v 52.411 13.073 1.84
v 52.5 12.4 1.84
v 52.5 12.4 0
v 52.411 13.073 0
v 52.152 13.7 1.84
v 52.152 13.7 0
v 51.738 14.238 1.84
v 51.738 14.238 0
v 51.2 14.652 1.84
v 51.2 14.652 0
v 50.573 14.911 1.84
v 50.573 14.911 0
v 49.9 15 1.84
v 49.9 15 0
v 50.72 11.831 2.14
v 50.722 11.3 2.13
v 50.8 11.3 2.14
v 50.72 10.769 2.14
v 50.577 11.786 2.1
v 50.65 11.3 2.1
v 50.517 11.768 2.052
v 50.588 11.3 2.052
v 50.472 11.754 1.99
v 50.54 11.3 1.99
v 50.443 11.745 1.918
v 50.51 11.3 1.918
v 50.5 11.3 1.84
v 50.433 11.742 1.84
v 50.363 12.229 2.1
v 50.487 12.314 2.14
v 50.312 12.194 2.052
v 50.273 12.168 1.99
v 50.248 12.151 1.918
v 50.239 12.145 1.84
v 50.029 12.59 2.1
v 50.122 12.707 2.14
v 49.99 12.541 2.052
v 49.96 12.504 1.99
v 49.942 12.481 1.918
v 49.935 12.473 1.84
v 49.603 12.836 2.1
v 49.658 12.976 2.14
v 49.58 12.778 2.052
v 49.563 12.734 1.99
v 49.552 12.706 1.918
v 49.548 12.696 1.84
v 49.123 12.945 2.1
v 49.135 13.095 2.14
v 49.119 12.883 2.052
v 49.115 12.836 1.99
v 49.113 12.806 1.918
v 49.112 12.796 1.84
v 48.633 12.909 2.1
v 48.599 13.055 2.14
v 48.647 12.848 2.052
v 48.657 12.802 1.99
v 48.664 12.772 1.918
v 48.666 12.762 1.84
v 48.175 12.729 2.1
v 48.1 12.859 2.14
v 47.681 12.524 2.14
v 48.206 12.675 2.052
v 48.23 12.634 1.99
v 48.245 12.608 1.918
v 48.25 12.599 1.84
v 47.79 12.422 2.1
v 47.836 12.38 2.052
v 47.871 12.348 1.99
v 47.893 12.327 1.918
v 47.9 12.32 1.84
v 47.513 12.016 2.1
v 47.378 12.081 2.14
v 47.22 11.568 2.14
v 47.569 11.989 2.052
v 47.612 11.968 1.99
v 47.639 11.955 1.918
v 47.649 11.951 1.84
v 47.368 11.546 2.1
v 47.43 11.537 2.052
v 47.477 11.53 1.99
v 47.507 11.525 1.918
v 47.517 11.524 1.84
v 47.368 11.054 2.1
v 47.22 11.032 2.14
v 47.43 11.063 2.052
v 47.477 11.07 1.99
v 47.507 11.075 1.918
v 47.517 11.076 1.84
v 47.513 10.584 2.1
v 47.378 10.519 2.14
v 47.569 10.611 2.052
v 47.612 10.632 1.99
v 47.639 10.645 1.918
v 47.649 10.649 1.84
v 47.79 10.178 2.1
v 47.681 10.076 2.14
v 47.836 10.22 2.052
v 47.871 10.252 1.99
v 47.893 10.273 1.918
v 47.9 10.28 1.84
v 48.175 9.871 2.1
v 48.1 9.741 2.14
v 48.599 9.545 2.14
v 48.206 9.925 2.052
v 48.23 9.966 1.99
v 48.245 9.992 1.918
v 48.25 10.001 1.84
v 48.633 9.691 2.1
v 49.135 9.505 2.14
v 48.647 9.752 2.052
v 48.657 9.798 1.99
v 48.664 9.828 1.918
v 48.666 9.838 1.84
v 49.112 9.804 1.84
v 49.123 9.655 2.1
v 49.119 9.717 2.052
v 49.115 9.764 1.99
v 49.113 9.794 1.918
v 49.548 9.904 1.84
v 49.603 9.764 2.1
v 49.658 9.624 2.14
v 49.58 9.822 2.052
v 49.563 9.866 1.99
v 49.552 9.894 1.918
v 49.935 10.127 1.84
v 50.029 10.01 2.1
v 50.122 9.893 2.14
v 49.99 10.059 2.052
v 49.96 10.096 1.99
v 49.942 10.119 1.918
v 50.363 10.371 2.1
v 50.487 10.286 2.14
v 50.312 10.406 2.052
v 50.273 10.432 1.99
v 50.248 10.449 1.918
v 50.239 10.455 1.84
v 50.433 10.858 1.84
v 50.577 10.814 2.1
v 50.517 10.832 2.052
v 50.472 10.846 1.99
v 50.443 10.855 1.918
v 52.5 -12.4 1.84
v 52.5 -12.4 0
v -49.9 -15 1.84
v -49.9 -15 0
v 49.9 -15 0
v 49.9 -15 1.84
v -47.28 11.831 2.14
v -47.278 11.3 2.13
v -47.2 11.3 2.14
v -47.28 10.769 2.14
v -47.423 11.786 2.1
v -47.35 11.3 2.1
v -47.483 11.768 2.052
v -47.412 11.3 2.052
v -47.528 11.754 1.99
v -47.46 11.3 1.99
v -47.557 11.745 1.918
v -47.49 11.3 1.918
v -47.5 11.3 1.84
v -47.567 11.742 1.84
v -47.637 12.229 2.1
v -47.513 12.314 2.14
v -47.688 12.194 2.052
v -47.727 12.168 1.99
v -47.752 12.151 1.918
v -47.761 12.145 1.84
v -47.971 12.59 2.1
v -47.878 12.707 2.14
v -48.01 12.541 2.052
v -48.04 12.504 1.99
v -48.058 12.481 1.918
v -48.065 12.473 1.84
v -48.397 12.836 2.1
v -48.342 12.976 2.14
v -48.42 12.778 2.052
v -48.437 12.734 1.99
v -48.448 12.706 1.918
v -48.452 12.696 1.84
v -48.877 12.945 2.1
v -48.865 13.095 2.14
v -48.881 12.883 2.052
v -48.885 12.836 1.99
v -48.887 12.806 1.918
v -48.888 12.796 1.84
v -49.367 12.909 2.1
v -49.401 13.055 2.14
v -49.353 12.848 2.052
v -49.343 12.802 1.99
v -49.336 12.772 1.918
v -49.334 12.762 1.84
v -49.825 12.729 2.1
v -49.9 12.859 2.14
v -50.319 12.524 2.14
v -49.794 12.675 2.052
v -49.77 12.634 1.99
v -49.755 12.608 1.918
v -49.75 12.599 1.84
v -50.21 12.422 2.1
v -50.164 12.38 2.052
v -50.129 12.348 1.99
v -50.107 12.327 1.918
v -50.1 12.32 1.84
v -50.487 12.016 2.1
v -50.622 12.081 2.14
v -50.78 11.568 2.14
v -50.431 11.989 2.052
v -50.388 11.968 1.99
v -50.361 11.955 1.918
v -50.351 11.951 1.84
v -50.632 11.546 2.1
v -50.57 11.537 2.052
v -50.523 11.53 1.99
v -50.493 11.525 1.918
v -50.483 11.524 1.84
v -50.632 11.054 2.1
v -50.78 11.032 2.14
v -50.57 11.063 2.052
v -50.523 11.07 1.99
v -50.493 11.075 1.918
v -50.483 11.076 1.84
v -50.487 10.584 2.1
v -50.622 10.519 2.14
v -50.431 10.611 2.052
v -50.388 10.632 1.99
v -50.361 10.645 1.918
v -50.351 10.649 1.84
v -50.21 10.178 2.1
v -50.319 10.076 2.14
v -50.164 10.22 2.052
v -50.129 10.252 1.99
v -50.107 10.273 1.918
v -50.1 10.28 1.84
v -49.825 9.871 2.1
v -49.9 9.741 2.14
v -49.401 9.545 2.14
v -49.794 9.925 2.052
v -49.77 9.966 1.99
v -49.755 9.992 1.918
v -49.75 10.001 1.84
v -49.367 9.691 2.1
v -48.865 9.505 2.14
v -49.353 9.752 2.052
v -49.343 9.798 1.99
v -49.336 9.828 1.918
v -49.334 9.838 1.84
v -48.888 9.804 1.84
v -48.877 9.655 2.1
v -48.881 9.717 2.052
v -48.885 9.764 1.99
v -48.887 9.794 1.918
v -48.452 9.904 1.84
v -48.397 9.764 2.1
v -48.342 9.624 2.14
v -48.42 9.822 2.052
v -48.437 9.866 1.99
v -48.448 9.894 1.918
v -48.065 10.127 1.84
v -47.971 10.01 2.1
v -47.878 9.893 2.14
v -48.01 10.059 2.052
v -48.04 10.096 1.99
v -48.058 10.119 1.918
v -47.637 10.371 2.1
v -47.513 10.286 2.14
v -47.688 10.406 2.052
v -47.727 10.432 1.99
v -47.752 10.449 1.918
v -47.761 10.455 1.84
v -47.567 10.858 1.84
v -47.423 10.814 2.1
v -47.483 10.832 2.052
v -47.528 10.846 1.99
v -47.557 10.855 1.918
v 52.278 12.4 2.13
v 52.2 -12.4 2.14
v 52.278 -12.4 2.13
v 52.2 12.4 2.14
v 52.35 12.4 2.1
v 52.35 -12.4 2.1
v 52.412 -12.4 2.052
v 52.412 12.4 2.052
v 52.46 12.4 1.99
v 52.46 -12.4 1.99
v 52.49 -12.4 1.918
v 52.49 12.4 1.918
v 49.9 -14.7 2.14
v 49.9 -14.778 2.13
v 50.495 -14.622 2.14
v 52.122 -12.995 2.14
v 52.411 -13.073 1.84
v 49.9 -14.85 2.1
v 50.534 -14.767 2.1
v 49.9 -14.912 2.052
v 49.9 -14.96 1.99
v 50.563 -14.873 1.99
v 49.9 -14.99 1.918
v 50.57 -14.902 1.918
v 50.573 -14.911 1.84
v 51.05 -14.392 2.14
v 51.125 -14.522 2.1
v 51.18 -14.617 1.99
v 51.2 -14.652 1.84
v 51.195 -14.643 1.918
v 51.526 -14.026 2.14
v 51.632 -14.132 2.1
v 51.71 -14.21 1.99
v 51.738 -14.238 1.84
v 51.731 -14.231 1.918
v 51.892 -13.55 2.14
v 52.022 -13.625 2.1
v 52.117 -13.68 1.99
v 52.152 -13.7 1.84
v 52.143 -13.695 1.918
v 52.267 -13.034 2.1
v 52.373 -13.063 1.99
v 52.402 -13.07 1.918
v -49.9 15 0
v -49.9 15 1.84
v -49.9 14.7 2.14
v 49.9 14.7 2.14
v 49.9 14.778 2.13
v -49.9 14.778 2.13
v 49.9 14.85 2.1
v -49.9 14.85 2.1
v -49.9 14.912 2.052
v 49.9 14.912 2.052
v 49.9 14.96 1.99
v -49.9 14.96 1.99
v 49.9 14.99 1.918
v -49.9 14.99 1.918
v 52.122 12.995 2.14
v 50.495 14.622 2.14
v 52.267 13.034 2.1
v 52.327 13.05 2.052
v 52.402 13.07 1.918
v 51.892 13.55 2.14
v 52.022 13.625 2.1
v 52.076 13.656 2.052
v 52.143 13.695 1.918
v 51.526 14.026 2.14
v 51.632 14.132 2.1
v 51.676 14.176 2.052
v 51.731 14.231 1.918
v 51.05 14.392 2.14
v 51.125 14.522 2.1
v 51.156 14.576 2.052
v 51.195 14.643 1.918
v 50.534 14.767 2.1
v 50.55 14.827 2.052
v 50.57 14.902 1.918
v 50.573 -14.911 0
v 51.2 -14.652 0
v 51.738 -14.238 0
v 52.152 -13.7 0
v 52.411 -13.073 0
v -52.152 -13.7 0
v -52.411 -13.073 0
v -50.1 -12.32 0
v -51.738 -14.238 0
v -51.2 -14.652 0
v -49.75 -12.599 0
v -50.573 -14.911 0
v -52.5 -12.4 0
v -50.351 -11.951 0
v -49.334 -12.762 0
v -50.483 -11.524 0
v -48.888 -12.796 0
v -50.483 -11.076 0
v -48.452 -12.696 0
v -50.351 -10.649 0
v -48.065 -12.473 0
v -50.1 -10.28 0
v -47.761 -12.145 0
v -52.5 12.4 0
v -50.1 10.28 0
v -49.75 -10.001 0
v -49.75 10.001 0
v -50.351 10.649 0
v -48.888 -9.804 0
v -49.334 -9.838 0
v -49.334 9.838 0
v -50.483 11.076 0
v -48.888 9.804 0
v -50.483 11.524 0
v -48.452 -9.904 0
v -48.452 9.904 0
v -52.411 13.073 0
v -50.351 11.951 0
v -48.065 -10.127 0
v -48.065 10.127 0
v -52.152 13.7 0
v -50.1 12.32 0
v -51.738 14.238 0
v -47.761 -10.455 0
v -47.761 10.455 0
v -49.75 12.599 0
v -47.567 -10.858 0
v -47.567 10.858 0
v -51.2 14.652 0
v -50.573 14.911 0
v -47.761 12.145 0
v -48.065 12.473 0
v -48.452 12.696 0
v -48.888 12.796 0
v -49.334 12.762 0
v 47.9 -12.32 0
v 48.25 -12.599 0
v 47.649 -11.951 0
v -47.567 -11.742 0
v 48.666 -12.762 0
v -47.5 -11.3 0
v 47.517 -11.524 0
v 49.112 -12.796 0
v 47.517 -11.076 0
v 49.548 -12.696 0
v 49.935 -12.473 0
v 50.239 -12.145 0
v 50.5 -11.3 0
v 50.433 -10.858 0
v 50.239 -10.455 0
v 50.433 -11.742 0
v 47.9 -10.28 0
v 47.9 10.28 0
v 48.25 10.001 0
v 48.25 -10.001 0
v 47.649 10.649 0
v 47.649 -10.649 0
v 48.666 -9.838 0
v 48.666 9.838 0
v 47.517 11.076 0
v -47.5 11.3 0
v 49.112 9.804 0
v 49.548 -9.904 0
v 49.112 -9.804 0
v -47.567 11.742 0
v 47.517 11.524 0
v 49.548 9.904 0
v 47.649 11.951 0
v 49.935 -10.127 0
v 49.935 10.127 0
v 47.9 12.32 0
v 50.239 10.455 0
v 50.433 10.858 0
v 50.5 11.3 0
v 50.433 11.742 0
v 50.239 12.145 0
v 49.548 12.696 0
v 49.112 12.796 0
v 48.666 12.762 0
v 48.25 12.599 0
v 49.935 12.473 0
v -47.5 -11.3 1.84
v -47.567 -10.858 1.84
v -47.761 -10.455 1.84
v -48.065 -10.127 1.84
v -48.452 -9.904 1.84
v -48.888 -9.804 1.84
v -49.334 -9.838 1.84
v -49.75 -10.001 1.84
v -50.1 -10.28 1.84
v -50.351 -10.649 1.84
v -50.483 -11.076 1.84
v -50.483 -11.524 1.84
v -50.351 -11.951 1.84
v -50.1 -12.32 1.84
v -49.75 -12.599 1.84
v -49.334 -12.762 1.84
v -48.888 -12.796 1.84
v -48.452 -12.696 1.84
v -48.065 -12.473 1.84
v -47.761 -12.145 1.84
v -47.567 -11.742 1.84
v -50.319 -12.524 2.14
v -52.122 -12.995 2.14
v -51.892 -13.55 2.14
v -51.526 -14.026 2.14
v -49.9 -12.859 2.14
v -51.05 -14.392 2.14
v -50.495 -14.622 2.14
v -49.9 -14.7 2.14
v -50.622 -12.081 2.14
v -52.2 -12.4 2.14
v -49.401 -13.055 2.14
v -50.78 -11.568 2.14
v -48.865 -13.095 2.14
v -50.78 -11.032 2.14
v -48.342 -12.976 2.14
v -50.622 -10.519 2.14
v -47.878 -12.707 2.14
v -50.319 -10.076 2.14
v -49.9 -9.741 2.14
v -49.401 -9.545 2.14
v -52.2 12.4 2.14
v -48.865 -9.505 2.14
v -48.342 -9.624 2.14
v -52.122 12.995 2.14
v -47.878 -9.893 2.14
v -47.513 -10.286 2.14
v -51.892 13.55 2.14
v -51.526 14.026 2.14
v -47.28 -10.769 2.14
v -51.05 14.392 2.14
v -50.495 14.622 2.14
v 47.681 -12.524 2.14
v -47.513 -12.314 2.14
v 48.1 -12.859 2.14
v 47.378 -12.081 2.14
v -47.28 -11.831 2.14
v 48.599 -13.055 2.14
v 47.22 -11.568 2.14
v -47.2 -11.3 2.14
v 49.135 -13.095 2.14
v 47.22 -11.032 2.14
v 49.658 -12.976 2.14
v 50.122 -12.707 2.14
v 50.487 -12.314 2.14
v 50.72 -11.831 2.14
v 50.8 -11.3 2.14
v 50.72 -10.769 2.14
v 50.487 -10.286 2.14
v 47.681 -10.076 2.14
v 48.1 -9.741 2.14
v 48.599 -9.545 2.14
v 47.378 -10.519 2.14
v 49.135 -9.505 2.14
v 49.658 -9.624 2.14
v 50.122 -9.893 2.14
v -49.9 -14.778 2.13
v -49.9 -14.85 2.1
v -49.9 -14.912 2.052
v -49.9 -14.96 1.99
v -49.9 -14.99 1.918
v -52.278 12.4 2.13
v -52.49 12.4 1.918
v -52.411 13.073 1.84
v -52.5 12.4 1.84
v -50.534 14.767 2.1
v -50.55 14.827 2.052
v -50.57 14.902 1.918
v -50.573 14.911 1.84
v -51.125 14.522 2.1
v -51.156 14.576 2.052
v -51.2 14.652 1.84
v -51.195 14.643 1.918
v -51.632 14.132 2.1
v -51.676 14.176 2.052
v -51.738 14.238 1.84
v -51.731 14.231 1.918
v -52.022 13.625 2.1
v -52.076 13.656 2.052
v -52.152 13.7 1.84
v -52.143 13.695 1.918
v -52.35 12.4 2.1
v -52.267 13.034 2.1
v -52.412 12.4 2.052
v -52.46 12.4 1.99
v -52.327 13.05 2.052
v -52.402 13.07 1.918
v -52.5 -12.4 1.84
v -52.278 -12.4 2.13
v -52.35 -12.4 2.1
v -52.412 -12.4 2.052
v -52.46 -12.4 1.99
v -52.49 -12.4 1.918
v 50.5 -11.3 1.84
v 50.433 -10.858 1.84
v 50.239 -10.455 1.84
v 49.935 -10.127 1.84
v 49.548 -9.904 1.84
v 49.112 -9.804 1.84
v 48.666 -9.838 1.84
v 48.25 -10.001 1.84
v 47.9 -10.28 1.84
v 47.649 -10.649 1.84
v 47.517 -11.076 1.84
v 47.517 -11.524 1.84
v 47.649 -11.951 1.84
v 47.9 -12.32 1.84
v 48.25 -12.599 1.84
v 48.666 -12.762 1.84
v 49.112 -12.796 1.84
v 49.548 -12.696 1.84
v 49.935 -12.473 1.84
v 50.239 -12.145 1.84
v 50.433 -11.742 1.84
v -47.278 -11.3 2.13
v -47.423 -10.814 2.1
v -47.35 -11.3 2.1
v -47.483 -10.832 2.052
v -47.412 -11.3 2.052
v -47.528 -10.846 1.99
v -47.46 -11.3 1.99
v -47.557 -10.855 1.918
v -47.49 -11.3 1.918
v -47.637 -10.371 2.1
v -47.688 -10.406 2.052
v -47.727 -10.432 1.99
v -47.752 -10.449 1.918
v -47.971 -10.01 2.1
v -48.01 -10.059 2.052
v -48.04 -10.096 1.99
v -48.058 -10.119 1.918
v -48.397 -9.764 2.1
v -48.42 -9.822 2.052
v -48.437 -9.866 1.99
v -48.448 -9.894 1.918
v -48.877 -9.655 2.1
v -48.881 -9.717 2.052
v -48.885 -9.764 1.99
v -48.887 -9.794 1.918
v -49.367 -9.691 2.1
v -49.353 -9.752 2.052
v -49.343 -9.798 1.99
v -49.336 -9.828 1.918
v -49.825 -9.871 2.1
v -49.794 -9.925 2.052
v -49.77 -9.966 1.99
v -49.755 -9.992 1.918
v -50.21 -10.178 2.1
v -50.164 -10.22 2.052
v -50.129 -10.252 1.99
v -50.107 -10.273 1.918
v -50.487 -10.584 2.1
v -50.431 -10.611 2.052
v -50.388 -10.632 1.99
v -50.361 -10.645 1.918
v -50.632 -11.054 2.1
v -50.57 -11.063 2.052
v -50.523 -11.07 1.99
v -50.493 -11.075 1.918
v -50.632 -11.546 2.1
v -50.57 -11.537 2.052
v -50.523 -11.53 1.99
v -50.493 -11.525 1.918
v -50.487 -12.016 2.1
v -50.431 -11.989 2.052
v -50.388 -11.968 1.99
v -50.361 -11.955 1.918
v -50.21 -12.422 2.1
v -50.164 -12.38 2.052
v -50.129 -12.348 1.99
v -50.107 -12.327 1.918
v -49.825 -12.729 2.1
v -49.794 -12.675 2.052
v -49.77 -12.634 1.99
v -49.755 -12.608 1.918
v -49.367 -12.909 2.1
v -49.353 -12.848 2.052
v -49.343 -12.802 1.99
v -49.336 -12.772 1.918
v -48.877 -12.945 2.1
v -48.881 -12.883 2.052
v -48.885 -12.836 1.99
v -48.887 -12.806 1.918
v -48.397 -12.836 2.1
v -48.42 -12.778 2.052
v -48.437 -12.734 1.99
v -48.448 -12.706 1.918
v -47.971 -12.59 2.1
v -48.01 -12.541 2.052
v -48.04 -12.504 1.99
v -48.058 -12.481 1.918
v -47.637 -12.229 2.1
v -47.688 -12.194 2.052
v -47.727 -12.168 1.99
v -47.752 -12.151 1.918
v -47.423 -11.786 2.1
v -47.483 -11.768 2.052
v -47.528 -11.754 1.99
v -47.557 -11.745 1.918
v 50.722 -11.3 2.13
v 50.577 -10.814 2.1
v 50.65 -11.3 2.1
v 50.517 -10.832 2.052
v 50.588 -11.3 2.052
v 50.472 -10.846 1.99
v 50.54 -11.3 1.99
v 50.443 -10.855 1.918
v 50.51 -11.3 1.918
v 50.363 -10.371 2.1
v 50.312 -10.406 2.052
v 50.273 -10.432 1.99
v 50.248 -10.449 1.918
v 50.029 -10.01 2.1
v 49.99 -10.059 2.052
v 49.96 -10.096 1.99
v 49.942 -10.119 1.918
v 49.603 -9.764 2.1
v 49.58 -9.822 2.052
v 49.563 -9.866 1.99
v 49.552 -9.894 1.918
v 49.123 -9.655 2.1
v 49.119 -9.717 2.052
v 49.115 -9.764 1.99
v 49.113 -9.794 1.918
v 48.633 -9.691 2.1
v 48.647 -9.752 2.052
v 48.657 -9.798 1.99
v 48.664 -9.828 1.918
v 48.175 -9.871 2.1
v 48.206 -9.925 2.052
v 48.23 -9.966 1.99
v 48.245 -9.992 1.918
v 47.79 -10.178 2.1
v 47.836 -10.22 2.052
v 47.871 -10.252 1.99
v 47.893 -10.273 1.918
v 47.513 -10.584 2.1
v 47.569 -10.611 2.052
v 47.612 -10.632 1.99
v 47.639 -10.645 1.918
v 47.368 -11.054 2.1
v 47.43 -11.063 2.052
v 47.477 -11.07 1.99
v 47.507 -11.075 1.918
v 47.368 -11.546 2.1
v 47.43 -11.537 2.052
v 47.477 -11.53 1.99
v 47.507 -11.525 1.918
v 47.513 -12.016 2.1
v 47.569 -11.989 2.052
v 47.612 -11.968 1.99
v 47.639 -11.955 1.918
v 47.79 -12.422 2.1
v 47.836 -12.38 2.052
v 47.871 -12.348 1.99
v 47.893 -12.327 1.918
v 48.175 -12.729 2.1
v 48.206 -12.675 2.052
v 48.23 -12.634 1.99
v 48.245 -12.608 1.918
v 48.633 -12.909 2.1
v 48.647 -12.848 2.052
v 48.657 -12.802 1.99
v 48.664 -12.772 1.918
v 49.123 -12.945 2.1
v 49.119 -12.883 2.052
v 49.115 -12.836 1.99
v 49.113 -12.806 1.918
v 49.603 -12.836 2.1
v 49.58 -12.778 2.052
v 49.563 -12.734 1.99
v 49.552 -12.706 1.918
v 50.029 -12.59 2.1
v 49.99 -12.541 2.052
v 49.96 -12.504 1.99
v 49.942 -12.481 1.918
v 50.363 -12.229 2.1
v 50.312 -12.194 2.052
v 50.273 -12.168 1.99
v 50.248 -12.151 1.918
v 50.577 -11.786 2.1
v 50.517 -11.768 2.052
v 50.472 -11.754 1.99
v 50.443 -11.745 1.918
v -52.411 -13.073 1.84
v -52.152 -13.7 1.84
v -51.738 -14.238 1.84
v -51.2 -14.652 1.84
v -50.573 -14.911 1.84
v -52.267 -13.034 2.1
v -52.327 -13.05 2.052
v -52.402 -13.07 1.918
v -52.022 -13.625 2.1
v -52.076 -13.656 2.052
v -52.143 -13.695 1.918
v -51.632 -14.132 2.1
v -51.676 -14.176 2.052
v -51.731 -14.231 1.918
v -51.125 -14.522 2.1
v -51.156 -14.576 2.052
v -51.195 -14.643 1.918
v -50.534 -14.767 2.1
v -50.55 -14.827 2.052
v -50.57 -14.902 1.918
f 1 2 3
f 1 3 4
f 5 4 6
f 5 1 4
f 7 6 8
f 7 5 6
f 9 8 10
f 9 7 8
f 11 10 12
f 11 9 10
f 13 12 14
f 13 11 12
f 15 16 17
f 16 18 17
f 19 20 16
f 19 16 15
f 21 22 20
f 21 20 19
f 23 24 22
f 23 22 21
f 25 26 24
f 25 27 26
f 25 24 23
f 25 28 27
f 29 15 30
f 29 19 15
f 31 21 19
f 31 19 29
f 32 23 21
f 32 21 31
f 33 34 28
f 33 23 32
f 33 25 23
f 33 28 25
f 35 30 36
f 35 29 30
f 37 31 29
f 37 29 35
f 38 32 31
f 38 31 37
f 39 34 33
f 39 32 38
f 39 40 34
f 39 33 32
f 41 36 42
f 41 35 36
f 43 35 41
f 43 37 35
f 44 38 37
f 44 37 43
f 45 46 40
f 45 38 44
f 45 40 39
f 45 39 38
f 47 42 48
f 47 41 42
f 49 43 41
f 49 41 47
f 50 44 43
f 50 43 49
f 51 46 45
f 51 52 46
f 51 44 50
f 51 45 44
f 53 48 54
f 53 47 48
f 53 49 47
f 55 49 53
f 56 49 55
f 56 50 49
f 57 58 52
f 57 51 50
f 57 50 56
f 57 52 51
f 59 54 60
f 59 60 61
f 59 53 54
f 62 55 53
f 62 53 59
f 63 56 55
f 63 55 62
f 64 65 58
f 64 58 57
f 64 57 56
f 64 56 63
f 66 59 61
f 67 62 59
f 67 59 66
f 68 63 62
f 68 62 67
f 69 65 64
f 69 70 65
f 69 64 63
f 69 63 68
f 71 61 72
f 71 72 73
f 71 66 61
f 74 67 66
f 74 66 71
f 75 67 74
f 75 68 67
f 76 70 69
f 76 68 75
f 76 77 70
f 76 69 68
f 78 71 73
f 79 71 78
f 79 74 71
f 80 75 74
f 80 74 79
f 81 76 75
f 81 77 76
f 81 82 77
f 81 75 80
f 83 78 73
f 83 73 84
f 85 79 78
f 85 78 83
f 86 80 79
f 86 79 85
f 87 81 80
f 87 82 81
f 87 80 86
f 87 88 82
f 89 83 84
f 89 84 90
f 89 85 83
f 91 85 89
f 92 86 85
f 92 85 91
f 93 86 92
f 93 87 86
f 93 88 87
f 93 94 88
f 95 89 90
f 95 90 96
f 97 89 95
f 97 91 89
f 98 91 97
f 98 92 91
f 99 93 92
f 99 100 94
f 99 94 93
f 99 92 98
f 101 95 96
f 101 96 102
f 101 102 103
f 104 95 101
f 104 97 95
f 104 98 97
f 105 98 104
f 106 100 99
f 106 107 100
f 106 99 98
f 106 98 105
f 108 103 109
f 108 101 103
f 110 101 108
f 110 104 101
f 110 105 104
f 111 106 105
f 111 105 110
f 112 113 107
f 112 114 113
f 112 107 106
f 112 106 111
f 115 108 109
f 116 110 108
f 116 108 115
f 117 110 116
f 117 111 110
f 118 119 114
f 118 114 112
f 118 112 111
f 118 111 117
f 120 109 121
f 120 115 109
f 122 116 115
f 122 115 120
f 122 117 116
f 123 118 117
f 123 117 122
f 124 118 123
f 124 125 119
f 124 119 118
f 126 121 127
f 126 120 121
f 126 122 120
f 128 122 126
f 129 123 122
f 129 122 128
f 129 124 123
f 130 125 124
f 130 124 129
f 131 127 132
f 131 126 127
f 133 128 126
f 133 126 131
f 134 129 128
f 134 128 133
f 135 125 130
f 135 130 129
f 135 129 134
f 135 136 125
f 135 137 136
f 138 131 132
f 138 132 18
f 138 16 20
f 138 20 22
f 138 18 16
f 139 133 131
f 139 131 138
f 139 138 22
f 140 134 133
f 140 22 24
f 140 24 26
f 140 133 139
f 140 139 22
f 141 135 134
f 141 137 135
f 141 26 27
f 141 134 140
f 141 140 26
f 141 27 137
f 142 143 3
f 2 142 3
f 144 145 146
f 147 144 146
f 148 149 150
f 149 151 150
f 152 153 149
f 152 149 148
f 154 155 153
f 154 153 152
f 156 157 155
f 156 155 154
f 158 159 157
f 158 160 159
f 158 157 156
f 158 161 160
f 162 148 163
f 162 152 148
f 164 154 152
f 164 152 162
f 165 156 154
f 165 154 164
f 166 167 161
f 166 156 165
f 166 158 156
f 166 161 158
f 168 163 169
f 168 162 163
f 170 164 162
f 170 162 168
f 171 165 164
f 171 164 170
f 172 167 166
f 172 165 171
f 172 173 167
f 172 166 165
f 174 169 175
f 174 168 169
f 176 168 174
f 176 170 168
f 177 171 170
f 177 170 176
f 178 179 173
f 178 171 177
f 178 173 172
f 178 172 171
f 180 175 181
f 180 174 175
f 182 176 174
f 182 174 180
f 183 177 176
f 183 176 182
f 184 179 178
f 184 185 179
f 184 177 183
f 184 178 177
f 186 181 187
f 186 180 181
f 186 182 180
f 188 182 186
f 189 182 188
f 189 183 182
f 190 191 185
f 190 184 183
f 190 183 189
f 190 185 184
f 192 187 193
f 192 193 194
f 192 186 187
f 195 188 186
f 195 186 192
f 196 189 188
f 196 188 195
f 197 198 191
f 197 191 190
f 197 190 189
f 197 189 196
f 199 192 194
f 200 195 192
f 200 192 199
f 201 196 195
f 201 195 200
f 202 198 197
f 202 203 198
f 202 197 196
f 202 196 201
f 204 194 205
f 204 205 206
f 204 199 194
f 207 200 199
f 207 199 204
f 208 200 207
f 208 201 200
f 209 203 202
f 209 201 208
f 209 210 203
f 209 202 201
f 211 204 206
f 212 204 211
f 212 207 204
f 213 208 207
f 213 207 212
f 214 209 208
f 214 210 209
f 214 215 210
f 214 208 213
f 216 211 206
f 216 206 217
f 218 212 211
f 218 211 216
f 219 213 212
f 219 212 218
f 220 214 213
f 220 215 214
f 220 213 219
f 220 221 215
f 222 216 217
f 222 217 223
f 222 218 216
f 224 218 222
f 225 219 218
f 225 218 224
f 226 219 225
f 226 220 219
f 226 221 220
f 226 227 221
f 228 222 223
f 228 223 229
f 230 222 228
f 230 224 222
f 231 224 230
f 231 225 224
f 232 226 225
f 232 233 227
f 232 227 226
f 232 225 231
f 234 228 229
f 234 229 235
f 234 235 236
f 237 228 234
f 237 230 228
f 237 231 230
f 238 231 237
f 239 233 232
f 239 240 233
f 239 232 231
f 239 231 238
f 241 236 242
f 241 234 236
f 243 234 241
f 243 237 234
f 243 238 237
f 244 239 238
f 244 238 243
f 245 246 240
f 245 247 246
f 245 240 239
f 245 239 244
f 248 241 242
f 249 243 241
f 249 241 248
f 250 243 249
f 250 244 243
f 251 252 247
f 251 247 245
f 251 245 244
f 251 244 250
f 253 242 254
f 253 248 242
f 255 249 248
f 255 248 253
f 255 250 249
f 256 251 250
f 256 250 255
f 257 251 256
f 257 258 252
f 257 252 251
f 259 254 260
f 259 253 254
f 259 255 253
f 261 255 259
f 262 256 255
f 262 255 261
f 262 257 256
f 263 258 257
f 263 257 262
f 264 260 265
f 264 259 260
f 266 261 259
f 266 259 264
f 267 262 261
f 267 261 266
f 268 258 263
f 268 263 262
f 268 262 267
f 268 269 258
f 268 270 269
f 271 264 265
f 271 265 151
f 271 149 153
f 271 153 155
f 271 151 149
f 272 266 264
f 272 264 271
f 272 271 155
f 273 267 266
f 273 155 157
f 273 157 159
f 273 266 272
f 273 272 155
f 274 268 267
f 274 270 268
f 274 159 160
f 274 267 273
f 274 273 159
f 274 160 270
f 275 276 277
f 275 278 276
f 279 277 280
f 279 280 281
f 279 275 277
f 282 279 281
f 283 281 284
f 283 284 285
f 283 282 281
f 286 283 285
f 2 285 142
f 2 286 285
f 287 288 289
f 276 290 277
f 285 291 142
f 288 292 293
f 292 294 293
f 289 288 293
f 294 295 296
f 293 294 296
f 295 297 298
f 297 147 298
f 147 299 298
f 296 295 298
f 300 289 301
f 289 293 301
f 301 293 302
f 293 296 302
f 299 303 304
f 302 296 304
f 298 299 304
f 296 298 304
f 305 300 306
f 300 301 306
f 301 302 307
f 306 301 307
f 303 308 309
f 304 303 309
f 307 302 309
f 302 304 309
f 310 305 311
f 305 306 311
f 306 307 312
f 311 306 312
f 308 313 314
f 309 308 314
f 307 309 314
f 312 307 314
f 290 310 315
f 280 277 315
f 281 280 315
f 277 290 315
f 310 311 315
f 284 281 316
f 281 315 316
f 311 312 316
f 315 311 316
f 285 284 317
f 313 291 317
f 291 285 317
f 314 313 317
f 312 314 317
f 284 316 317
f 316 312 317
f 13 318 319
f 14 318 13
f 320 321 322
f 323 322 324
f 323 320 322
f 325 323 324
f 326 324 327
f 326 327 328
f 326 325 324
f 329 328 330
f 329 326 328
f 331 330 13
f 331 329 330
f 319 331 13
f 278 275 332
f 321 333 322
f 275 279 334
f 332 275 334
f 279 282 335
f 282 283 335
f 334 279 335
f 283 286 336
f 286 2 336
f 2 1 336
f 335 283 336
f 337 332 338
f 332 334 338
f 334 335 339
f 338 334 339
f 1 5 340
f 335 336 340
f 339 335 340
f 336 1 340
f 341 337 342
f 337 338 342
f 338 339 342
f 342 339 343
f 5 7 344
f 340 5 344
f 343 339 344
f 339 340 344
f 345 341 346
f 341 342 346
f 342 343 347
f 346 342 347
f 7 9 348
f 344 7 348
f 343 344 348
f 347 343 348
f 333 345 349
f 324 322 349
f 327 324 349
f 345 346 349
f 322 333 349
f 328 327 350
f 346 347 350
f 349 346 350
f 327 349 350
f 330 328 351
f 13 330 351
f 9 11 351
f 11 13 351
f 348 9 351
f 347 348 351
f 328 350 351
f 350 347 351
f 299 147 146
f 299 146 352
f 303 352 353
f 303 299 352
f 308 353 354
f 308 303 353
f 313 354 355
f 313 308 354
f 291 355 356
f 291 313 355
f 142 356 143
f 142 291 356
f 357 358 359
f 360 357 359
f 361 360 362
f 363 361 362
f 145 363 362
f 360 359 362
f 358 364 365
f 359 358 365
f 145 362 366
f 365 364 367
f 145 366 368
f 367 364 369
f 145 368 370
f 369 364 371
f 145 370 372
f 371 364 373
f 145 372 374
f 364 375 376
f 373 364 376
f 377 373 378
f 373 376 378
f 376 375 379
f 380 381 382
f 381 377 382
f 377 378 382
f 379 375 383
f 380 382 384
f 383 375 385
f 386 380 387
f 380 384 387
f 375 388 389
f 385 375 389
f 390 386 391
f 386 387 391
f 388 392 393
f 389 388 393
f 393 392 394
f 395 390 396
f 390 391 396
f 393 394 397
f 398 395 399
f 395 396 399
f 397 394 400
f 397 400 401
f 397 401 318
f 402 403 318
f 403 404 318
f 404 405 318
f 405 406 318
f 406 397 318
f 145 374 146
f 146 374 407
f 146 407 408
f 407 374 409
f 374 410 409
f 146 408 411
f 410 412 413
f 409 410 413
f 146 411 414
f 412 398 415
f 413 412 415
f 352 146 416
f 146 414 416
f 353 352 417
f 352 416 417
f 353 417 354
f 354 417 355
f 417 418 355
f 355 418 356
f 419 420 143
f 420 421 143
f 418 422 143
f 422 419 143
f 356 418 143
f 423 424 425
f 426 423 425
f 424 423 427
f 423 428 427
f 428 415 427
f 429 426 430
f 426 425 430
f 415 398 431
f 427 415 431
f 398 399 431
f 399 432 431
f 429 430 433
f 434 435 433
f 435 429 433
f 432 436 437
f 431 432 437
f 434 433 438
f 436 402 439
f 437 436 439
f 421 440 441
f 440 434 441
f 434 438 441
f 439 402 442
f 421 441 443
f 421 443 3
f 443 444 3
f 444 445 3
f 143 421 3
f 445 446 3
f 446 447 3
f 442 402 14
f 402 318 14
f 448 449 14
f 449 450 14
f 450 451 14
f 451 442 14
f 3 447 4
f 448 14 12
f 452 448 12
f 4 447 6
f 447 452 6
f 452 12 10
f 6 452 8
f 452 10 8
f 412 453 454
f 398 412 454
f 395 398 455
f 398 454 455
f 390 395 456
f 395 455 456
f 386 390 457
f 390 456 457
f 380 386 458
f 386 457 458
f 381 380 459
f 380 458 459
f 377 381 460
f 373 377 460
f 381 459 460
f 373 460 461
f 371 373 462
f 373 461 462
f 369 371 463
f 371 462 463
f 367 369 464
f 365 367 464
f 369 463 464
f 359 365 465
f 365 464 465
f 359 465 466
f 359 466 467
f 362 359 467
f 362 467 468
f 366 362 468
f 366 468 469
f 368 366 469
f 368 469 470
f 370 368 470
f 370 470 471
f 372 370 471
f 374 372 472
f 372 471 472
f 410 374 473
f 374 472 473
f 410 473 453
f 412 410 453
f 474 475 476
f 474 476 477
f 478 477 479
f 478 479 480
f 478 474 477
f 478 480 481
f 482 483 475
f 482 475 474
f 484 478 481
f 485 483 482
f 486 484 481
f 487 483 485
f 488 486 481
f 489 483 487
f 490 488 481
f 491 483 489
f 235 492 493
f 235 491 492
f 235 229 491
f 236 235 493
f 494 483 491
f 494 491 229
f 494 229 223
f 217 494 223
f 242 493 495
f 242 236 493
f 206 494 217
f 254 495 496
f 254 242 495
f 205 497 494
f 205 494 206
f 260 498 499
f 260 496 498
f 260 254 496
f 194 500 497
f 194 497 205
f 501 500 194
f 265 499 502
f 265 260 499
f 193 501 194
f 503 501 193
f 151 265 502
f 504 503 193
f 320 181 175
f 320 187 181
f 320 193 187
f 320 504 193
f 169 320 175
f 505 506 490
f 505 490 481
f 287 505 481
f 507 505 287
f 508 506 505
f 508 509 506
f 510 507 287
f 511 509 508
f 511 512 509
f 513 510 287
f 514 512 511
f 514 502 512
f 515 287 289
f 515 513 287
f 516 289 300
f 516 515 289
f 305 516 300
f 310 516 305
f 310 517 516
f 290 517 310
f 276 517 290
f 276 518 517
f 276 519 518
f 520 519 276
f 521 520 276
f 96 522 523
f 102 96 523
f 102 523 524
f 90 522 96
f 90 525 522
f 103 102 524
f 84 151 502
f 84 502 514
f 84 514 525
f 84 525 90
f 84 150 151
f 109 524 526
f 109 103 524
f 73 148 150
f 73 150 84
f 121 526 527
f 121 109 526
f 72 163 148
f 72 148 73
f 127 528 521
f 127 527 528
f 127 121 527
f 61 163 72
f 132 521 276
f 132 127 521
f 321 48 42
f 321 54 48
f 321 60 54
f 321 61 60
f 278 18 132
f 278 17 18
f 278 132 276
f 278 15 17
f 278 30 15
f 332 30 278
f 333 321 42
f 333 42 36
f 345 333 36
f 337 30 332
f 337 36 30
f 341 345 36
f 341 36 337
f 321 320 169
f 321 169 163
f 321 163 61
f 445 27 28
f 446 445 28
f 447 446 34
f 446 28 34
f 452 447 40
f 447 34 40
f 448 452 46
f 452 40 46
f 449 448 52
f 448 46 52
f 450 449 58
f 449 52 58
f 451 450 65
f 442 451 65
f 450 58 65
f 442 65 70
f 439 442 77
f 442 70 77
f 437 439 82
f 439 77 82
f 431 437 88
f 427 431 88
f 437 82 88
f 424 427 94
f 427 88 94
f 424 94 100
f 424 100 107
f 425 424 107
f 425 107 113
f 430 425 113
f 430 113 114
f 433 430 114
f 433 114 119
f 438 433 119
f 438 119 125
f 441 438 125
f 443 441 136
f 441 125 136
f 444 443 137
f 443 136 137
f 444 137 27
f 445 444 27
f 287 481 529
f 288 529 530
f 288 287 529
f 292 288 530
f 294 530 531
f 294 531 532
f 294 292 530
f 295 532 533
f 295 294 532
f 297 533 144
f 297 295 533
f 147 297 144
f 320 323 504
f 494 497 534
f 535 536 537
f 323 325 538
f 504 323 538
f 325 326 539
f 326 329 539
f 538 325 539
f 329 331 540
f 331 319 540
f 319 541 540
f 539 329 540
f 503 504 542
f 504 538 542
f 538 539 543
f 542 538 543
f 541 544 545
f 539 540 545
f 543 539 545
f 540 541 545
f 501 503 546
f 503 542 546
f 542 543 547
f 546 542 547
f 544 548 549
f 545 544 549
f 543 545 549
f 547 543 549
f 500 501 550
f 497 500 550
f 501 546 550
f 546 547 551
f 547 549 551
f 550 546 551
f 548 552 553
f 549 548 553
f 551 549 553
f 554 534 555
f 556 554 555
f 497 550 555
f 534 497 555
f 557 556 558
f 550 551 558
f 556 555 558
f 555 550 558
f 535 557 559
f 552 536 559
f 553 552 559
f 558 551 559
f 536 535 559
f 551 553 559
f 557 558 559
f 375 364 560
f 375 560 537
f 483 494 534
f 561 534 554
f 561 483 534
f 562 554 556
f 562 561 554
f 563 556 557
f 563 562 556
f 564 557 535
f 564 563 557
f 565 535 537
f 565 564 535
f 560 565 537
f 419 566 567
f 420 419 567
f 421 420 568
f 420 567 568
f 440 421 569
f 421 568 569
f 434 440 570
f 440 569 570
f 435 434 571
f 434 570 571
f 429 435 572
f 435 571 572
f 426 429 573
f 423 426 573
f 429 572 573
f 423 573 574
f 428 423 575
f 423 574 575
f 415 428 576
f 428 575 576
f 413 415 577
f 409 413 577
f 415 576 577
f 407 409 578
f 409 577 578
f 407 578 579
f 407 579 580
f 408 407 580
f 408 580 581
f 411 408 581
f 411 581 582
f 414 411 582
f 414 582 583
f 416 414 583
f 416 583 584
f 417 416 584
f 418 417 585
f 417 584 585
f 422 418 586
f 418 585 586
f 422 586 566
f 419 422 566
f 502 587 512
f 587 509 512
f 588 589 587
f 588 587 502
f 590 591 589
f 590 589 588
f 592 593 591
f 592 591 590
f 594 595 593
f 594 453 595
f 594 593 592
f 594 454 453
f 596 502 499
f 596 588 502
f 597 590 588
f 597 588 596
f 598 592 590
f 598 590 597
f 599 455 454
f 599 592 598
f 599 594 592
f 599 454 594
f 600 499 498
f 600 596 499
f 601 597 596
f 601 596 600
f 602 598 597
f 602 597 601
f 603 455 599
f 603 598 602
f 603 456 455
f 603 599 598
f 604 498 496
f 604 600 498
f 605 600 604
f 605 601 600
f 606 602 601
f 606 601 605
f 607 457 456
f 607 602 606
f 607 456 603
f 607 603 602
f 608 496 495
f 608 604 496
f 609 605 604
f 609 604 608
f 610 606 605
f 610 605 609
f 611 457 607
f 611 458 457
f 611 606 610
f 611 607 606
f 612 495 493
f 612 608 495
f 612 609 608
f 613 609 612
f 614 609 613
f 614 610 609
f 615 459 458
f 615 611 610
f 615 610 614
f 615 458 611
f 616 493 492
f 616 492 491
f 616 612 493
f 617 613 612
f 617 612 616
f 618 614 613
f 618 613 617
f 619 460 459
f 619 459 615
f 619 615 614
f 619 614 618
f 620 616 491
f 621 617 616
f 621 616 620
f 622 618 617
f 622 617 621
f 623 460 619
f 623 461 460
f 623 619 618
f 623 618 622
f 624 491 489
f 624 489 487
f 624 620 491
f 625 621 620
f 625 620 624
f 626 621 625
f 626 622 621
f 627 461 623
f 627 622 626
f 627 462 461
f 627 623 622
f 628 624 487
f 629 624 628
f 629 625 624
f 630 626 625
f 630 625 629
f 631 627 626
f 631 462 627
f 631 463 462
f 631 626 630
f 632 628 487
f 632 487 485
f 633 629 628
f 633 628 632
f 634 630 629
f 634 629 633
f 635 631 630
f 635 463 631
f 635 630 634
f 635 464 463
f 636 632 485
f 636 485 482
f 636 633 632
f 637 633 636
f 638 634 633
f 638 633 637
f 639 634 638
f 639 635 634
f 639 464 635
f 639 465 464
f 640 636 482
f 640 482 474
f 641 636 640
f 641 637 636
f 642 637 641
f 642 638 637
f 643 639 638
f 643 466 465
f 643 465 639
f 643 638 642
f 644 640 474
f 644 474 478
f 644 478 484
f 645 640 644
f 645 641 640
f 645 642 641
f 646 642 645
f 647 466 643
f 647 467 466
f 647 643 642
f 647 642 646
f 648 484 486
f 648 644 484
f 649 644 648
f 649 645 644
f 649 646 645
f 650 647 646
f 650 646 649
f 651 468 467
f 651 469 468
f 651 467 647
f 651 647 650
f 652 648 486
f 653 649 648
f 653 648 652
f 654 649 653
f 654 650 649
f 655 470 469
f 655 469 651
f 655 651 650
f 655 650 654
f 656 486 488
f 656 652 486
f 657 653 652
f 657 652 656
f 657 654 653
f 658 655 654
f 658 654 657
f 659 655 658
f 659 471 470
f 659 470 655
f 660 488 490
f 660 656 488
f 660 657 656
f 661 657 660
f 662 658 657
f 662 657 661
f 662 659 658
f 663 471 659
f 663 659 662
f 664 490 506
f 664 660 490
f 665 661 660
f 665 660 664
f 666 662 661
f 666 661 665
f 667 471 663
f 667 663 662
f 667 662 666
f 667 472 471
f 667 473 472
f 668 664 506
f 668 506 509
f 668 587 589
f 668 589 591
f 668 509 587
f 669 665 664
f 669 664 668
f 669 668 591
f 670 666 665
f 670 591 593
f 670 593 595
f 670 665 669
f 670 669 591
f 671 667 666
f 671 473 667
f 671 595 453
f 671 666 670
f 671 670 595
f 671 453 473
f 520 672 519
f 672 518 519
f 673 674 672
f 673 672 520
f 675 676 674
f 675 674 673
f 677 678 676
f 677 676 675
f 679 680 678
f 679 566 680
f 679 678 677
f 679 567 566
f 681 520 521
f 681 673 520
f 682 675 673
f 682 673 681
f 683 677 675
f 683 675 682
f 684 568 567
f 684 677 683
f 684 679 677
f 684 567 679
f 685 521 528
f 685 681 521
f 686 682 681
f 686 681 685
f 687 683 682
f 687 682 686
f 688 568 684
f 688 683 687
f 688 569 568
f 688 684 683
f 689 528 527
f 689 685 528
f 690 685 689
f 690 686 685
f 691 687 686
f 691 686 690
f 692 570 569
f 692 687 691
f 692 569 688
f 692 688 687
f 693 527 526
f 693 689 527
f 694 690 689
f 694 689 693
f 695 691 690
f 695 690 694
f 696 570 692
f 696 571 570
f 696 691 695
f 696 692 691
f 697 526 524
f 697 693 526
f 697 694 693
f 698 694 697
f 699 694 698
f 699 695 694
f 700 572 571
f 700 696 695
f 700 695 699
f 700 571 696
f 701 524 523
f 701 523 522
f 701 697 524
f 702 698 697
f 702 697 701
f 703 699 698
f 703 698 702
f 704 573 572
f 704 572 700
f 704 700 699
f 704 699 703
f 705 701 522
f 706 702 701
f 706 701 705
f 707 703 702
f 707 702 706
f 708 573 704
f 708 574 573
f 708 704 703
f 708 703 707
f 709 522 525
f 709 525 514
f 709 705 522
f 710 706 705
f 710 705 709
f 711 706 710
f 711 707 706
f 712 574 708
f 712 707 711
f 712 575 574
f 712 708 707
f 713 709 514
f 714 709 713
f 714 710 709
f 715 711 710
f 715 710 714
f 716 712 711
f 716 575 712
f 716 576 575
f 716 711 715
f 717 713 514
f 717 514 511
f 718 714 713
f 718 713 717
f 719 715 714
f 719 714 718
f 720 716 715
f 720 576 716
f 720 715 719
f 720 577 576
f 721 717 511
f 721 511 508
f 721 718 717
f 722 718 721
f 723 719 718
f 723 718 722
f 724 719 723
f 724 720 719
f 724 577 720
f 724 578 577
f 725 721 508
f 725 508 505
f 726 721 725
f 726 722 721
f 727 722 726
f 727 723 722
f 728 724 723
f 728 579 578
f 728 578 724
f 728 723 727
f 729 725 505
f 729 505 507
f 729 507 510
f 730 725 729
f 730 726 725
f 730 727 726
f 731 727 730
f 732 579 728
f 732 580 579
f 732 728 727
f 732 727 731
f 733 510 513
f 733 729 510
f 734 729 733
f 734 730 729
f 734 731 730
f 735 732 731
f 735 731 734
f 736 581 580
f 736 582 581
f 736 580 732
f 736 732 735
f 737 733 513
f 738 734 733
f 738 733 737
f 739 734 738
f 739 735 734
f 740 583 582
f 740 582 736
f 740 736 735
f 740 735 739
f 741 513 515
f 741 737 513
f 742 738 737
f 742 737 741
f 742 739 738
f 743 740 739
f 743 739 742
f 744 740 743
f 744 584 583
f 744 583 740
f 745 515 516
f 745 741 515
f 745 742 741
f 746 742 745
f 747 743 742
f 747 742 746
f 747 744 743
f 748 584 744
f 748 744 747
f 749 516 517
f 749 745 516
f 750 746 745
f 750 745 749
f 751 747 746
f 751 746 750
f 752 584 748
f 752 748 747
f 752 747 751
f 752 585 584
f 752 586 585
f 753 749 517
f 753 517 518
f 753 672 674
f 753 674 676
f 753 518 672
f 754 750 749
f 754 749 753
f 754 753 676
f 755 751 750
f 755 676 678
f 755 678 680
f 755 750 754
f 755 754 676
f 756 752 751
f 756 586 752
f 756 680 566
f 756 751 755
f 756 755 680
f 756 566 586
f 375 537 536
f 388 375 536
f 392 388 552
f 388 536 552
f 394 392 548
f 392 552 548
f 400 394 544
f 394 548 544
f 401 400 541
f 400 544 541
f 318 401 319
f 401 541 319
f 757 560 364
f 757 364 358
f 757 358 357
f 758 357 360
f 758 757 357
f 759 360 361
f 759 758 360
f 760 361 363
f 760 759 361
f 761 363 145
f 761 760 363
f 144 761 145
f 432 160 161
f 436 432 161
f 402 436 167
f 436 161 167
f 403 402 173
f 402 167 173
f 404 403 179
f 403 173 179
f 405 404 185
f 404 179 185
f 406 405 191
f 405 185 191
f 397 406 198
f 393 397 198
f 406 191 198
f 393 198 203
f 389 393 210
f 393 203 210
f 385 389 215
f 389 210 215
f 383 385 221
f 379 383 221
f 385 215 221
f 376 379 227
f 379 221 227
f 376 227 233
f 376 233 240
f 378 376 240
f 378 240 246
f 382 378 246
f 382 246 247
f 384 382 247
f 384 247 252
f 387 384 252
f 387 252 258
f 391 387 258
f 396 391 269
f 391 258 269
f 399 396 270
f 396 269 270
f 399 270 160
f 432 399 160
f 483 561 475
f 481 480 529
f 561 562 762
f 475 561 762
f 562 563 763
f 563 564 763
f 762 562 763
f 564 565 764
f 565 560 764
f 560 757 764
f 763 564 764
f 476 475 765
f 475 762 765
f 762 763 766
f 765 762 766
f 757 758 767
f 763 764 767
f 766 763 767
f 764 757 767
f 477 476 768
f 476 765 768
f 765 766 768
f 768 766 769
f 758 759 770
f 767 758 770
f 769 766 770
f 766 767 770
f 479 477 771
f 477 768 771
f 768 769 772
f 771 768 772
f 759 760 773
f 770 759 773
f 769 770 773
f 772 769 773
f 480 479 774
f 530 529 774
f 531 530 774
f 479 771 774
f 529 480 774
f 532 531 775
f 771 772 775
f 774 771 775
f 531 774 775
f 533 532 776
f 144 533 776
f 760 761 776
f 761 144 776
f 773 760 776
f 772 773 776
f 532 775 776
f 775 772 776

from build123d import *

# Parameters (mm, degrees)
F0_W     = 105
F0_H     = 30
F1_DEPTH = 2.14
F2_R     = 2.6
F3_R     = 1.5
F4_DEPTH = 2.14
F5_R     = 0.3


with BuildPart() as f1:
    # F0 (on Top) → F1 (new body)
    with BuildSketch(Plane.XY):
        Rectangle(F0_W, F0_H)
    extrude(amount=F1_DEPTH)

    # F2
    f2_edges = [f1.edges().sort_by_distance(p)[0] for p in [
        (-52.5, -15, 1.07),
        (-52.5, 15, 1.07),
        (52.5, 15, 1.07),
        (52.5, -15, 1.07),
    ]]
    fillet(f2_edges, radius=F2_R)

    # F3 (on face) → F4 (cut, through all)
    with BuildSketch(Plane.XY.offset(2.14)):
        with Locations((-49, 11.3)):
            Circle(F3_R)
        with Locations((-49, -11.3)):
            Circle(F3_R)
        with Locations((49, -11.3)):
            Circle(F3_R)
        with Locations((49, 11.3)):
            Circle(F3_R)
    extrude(amount=-F4_DEPTH, mode=Mode.SUBTRACT)

    # F5
    f5_edges = [f1.edges().sort_by_distance(p)[0] for p in [
        (52.5, 0, 2.14),
        (51.738478, -14.238478, 2.14),
        (51.738478, 14.238478, 2.14),
        (0, -15, 2.14),
        (0, 15, 2.14),
        (-51.738478, -14.238478, 2.14),
        (-51.738478, 14.238478, 2.14),
        (-52.5, 0, 2.14),
        (-50.5, -11.3, 2.14),
        (47.5, -11.3, 2.14),
        (-50.5, 11.3, 2.14),
        (47.5, 11.3, 2.14),
    ]]
    fillet(f5_edges, radius=F5_R)


solid = f1.part
